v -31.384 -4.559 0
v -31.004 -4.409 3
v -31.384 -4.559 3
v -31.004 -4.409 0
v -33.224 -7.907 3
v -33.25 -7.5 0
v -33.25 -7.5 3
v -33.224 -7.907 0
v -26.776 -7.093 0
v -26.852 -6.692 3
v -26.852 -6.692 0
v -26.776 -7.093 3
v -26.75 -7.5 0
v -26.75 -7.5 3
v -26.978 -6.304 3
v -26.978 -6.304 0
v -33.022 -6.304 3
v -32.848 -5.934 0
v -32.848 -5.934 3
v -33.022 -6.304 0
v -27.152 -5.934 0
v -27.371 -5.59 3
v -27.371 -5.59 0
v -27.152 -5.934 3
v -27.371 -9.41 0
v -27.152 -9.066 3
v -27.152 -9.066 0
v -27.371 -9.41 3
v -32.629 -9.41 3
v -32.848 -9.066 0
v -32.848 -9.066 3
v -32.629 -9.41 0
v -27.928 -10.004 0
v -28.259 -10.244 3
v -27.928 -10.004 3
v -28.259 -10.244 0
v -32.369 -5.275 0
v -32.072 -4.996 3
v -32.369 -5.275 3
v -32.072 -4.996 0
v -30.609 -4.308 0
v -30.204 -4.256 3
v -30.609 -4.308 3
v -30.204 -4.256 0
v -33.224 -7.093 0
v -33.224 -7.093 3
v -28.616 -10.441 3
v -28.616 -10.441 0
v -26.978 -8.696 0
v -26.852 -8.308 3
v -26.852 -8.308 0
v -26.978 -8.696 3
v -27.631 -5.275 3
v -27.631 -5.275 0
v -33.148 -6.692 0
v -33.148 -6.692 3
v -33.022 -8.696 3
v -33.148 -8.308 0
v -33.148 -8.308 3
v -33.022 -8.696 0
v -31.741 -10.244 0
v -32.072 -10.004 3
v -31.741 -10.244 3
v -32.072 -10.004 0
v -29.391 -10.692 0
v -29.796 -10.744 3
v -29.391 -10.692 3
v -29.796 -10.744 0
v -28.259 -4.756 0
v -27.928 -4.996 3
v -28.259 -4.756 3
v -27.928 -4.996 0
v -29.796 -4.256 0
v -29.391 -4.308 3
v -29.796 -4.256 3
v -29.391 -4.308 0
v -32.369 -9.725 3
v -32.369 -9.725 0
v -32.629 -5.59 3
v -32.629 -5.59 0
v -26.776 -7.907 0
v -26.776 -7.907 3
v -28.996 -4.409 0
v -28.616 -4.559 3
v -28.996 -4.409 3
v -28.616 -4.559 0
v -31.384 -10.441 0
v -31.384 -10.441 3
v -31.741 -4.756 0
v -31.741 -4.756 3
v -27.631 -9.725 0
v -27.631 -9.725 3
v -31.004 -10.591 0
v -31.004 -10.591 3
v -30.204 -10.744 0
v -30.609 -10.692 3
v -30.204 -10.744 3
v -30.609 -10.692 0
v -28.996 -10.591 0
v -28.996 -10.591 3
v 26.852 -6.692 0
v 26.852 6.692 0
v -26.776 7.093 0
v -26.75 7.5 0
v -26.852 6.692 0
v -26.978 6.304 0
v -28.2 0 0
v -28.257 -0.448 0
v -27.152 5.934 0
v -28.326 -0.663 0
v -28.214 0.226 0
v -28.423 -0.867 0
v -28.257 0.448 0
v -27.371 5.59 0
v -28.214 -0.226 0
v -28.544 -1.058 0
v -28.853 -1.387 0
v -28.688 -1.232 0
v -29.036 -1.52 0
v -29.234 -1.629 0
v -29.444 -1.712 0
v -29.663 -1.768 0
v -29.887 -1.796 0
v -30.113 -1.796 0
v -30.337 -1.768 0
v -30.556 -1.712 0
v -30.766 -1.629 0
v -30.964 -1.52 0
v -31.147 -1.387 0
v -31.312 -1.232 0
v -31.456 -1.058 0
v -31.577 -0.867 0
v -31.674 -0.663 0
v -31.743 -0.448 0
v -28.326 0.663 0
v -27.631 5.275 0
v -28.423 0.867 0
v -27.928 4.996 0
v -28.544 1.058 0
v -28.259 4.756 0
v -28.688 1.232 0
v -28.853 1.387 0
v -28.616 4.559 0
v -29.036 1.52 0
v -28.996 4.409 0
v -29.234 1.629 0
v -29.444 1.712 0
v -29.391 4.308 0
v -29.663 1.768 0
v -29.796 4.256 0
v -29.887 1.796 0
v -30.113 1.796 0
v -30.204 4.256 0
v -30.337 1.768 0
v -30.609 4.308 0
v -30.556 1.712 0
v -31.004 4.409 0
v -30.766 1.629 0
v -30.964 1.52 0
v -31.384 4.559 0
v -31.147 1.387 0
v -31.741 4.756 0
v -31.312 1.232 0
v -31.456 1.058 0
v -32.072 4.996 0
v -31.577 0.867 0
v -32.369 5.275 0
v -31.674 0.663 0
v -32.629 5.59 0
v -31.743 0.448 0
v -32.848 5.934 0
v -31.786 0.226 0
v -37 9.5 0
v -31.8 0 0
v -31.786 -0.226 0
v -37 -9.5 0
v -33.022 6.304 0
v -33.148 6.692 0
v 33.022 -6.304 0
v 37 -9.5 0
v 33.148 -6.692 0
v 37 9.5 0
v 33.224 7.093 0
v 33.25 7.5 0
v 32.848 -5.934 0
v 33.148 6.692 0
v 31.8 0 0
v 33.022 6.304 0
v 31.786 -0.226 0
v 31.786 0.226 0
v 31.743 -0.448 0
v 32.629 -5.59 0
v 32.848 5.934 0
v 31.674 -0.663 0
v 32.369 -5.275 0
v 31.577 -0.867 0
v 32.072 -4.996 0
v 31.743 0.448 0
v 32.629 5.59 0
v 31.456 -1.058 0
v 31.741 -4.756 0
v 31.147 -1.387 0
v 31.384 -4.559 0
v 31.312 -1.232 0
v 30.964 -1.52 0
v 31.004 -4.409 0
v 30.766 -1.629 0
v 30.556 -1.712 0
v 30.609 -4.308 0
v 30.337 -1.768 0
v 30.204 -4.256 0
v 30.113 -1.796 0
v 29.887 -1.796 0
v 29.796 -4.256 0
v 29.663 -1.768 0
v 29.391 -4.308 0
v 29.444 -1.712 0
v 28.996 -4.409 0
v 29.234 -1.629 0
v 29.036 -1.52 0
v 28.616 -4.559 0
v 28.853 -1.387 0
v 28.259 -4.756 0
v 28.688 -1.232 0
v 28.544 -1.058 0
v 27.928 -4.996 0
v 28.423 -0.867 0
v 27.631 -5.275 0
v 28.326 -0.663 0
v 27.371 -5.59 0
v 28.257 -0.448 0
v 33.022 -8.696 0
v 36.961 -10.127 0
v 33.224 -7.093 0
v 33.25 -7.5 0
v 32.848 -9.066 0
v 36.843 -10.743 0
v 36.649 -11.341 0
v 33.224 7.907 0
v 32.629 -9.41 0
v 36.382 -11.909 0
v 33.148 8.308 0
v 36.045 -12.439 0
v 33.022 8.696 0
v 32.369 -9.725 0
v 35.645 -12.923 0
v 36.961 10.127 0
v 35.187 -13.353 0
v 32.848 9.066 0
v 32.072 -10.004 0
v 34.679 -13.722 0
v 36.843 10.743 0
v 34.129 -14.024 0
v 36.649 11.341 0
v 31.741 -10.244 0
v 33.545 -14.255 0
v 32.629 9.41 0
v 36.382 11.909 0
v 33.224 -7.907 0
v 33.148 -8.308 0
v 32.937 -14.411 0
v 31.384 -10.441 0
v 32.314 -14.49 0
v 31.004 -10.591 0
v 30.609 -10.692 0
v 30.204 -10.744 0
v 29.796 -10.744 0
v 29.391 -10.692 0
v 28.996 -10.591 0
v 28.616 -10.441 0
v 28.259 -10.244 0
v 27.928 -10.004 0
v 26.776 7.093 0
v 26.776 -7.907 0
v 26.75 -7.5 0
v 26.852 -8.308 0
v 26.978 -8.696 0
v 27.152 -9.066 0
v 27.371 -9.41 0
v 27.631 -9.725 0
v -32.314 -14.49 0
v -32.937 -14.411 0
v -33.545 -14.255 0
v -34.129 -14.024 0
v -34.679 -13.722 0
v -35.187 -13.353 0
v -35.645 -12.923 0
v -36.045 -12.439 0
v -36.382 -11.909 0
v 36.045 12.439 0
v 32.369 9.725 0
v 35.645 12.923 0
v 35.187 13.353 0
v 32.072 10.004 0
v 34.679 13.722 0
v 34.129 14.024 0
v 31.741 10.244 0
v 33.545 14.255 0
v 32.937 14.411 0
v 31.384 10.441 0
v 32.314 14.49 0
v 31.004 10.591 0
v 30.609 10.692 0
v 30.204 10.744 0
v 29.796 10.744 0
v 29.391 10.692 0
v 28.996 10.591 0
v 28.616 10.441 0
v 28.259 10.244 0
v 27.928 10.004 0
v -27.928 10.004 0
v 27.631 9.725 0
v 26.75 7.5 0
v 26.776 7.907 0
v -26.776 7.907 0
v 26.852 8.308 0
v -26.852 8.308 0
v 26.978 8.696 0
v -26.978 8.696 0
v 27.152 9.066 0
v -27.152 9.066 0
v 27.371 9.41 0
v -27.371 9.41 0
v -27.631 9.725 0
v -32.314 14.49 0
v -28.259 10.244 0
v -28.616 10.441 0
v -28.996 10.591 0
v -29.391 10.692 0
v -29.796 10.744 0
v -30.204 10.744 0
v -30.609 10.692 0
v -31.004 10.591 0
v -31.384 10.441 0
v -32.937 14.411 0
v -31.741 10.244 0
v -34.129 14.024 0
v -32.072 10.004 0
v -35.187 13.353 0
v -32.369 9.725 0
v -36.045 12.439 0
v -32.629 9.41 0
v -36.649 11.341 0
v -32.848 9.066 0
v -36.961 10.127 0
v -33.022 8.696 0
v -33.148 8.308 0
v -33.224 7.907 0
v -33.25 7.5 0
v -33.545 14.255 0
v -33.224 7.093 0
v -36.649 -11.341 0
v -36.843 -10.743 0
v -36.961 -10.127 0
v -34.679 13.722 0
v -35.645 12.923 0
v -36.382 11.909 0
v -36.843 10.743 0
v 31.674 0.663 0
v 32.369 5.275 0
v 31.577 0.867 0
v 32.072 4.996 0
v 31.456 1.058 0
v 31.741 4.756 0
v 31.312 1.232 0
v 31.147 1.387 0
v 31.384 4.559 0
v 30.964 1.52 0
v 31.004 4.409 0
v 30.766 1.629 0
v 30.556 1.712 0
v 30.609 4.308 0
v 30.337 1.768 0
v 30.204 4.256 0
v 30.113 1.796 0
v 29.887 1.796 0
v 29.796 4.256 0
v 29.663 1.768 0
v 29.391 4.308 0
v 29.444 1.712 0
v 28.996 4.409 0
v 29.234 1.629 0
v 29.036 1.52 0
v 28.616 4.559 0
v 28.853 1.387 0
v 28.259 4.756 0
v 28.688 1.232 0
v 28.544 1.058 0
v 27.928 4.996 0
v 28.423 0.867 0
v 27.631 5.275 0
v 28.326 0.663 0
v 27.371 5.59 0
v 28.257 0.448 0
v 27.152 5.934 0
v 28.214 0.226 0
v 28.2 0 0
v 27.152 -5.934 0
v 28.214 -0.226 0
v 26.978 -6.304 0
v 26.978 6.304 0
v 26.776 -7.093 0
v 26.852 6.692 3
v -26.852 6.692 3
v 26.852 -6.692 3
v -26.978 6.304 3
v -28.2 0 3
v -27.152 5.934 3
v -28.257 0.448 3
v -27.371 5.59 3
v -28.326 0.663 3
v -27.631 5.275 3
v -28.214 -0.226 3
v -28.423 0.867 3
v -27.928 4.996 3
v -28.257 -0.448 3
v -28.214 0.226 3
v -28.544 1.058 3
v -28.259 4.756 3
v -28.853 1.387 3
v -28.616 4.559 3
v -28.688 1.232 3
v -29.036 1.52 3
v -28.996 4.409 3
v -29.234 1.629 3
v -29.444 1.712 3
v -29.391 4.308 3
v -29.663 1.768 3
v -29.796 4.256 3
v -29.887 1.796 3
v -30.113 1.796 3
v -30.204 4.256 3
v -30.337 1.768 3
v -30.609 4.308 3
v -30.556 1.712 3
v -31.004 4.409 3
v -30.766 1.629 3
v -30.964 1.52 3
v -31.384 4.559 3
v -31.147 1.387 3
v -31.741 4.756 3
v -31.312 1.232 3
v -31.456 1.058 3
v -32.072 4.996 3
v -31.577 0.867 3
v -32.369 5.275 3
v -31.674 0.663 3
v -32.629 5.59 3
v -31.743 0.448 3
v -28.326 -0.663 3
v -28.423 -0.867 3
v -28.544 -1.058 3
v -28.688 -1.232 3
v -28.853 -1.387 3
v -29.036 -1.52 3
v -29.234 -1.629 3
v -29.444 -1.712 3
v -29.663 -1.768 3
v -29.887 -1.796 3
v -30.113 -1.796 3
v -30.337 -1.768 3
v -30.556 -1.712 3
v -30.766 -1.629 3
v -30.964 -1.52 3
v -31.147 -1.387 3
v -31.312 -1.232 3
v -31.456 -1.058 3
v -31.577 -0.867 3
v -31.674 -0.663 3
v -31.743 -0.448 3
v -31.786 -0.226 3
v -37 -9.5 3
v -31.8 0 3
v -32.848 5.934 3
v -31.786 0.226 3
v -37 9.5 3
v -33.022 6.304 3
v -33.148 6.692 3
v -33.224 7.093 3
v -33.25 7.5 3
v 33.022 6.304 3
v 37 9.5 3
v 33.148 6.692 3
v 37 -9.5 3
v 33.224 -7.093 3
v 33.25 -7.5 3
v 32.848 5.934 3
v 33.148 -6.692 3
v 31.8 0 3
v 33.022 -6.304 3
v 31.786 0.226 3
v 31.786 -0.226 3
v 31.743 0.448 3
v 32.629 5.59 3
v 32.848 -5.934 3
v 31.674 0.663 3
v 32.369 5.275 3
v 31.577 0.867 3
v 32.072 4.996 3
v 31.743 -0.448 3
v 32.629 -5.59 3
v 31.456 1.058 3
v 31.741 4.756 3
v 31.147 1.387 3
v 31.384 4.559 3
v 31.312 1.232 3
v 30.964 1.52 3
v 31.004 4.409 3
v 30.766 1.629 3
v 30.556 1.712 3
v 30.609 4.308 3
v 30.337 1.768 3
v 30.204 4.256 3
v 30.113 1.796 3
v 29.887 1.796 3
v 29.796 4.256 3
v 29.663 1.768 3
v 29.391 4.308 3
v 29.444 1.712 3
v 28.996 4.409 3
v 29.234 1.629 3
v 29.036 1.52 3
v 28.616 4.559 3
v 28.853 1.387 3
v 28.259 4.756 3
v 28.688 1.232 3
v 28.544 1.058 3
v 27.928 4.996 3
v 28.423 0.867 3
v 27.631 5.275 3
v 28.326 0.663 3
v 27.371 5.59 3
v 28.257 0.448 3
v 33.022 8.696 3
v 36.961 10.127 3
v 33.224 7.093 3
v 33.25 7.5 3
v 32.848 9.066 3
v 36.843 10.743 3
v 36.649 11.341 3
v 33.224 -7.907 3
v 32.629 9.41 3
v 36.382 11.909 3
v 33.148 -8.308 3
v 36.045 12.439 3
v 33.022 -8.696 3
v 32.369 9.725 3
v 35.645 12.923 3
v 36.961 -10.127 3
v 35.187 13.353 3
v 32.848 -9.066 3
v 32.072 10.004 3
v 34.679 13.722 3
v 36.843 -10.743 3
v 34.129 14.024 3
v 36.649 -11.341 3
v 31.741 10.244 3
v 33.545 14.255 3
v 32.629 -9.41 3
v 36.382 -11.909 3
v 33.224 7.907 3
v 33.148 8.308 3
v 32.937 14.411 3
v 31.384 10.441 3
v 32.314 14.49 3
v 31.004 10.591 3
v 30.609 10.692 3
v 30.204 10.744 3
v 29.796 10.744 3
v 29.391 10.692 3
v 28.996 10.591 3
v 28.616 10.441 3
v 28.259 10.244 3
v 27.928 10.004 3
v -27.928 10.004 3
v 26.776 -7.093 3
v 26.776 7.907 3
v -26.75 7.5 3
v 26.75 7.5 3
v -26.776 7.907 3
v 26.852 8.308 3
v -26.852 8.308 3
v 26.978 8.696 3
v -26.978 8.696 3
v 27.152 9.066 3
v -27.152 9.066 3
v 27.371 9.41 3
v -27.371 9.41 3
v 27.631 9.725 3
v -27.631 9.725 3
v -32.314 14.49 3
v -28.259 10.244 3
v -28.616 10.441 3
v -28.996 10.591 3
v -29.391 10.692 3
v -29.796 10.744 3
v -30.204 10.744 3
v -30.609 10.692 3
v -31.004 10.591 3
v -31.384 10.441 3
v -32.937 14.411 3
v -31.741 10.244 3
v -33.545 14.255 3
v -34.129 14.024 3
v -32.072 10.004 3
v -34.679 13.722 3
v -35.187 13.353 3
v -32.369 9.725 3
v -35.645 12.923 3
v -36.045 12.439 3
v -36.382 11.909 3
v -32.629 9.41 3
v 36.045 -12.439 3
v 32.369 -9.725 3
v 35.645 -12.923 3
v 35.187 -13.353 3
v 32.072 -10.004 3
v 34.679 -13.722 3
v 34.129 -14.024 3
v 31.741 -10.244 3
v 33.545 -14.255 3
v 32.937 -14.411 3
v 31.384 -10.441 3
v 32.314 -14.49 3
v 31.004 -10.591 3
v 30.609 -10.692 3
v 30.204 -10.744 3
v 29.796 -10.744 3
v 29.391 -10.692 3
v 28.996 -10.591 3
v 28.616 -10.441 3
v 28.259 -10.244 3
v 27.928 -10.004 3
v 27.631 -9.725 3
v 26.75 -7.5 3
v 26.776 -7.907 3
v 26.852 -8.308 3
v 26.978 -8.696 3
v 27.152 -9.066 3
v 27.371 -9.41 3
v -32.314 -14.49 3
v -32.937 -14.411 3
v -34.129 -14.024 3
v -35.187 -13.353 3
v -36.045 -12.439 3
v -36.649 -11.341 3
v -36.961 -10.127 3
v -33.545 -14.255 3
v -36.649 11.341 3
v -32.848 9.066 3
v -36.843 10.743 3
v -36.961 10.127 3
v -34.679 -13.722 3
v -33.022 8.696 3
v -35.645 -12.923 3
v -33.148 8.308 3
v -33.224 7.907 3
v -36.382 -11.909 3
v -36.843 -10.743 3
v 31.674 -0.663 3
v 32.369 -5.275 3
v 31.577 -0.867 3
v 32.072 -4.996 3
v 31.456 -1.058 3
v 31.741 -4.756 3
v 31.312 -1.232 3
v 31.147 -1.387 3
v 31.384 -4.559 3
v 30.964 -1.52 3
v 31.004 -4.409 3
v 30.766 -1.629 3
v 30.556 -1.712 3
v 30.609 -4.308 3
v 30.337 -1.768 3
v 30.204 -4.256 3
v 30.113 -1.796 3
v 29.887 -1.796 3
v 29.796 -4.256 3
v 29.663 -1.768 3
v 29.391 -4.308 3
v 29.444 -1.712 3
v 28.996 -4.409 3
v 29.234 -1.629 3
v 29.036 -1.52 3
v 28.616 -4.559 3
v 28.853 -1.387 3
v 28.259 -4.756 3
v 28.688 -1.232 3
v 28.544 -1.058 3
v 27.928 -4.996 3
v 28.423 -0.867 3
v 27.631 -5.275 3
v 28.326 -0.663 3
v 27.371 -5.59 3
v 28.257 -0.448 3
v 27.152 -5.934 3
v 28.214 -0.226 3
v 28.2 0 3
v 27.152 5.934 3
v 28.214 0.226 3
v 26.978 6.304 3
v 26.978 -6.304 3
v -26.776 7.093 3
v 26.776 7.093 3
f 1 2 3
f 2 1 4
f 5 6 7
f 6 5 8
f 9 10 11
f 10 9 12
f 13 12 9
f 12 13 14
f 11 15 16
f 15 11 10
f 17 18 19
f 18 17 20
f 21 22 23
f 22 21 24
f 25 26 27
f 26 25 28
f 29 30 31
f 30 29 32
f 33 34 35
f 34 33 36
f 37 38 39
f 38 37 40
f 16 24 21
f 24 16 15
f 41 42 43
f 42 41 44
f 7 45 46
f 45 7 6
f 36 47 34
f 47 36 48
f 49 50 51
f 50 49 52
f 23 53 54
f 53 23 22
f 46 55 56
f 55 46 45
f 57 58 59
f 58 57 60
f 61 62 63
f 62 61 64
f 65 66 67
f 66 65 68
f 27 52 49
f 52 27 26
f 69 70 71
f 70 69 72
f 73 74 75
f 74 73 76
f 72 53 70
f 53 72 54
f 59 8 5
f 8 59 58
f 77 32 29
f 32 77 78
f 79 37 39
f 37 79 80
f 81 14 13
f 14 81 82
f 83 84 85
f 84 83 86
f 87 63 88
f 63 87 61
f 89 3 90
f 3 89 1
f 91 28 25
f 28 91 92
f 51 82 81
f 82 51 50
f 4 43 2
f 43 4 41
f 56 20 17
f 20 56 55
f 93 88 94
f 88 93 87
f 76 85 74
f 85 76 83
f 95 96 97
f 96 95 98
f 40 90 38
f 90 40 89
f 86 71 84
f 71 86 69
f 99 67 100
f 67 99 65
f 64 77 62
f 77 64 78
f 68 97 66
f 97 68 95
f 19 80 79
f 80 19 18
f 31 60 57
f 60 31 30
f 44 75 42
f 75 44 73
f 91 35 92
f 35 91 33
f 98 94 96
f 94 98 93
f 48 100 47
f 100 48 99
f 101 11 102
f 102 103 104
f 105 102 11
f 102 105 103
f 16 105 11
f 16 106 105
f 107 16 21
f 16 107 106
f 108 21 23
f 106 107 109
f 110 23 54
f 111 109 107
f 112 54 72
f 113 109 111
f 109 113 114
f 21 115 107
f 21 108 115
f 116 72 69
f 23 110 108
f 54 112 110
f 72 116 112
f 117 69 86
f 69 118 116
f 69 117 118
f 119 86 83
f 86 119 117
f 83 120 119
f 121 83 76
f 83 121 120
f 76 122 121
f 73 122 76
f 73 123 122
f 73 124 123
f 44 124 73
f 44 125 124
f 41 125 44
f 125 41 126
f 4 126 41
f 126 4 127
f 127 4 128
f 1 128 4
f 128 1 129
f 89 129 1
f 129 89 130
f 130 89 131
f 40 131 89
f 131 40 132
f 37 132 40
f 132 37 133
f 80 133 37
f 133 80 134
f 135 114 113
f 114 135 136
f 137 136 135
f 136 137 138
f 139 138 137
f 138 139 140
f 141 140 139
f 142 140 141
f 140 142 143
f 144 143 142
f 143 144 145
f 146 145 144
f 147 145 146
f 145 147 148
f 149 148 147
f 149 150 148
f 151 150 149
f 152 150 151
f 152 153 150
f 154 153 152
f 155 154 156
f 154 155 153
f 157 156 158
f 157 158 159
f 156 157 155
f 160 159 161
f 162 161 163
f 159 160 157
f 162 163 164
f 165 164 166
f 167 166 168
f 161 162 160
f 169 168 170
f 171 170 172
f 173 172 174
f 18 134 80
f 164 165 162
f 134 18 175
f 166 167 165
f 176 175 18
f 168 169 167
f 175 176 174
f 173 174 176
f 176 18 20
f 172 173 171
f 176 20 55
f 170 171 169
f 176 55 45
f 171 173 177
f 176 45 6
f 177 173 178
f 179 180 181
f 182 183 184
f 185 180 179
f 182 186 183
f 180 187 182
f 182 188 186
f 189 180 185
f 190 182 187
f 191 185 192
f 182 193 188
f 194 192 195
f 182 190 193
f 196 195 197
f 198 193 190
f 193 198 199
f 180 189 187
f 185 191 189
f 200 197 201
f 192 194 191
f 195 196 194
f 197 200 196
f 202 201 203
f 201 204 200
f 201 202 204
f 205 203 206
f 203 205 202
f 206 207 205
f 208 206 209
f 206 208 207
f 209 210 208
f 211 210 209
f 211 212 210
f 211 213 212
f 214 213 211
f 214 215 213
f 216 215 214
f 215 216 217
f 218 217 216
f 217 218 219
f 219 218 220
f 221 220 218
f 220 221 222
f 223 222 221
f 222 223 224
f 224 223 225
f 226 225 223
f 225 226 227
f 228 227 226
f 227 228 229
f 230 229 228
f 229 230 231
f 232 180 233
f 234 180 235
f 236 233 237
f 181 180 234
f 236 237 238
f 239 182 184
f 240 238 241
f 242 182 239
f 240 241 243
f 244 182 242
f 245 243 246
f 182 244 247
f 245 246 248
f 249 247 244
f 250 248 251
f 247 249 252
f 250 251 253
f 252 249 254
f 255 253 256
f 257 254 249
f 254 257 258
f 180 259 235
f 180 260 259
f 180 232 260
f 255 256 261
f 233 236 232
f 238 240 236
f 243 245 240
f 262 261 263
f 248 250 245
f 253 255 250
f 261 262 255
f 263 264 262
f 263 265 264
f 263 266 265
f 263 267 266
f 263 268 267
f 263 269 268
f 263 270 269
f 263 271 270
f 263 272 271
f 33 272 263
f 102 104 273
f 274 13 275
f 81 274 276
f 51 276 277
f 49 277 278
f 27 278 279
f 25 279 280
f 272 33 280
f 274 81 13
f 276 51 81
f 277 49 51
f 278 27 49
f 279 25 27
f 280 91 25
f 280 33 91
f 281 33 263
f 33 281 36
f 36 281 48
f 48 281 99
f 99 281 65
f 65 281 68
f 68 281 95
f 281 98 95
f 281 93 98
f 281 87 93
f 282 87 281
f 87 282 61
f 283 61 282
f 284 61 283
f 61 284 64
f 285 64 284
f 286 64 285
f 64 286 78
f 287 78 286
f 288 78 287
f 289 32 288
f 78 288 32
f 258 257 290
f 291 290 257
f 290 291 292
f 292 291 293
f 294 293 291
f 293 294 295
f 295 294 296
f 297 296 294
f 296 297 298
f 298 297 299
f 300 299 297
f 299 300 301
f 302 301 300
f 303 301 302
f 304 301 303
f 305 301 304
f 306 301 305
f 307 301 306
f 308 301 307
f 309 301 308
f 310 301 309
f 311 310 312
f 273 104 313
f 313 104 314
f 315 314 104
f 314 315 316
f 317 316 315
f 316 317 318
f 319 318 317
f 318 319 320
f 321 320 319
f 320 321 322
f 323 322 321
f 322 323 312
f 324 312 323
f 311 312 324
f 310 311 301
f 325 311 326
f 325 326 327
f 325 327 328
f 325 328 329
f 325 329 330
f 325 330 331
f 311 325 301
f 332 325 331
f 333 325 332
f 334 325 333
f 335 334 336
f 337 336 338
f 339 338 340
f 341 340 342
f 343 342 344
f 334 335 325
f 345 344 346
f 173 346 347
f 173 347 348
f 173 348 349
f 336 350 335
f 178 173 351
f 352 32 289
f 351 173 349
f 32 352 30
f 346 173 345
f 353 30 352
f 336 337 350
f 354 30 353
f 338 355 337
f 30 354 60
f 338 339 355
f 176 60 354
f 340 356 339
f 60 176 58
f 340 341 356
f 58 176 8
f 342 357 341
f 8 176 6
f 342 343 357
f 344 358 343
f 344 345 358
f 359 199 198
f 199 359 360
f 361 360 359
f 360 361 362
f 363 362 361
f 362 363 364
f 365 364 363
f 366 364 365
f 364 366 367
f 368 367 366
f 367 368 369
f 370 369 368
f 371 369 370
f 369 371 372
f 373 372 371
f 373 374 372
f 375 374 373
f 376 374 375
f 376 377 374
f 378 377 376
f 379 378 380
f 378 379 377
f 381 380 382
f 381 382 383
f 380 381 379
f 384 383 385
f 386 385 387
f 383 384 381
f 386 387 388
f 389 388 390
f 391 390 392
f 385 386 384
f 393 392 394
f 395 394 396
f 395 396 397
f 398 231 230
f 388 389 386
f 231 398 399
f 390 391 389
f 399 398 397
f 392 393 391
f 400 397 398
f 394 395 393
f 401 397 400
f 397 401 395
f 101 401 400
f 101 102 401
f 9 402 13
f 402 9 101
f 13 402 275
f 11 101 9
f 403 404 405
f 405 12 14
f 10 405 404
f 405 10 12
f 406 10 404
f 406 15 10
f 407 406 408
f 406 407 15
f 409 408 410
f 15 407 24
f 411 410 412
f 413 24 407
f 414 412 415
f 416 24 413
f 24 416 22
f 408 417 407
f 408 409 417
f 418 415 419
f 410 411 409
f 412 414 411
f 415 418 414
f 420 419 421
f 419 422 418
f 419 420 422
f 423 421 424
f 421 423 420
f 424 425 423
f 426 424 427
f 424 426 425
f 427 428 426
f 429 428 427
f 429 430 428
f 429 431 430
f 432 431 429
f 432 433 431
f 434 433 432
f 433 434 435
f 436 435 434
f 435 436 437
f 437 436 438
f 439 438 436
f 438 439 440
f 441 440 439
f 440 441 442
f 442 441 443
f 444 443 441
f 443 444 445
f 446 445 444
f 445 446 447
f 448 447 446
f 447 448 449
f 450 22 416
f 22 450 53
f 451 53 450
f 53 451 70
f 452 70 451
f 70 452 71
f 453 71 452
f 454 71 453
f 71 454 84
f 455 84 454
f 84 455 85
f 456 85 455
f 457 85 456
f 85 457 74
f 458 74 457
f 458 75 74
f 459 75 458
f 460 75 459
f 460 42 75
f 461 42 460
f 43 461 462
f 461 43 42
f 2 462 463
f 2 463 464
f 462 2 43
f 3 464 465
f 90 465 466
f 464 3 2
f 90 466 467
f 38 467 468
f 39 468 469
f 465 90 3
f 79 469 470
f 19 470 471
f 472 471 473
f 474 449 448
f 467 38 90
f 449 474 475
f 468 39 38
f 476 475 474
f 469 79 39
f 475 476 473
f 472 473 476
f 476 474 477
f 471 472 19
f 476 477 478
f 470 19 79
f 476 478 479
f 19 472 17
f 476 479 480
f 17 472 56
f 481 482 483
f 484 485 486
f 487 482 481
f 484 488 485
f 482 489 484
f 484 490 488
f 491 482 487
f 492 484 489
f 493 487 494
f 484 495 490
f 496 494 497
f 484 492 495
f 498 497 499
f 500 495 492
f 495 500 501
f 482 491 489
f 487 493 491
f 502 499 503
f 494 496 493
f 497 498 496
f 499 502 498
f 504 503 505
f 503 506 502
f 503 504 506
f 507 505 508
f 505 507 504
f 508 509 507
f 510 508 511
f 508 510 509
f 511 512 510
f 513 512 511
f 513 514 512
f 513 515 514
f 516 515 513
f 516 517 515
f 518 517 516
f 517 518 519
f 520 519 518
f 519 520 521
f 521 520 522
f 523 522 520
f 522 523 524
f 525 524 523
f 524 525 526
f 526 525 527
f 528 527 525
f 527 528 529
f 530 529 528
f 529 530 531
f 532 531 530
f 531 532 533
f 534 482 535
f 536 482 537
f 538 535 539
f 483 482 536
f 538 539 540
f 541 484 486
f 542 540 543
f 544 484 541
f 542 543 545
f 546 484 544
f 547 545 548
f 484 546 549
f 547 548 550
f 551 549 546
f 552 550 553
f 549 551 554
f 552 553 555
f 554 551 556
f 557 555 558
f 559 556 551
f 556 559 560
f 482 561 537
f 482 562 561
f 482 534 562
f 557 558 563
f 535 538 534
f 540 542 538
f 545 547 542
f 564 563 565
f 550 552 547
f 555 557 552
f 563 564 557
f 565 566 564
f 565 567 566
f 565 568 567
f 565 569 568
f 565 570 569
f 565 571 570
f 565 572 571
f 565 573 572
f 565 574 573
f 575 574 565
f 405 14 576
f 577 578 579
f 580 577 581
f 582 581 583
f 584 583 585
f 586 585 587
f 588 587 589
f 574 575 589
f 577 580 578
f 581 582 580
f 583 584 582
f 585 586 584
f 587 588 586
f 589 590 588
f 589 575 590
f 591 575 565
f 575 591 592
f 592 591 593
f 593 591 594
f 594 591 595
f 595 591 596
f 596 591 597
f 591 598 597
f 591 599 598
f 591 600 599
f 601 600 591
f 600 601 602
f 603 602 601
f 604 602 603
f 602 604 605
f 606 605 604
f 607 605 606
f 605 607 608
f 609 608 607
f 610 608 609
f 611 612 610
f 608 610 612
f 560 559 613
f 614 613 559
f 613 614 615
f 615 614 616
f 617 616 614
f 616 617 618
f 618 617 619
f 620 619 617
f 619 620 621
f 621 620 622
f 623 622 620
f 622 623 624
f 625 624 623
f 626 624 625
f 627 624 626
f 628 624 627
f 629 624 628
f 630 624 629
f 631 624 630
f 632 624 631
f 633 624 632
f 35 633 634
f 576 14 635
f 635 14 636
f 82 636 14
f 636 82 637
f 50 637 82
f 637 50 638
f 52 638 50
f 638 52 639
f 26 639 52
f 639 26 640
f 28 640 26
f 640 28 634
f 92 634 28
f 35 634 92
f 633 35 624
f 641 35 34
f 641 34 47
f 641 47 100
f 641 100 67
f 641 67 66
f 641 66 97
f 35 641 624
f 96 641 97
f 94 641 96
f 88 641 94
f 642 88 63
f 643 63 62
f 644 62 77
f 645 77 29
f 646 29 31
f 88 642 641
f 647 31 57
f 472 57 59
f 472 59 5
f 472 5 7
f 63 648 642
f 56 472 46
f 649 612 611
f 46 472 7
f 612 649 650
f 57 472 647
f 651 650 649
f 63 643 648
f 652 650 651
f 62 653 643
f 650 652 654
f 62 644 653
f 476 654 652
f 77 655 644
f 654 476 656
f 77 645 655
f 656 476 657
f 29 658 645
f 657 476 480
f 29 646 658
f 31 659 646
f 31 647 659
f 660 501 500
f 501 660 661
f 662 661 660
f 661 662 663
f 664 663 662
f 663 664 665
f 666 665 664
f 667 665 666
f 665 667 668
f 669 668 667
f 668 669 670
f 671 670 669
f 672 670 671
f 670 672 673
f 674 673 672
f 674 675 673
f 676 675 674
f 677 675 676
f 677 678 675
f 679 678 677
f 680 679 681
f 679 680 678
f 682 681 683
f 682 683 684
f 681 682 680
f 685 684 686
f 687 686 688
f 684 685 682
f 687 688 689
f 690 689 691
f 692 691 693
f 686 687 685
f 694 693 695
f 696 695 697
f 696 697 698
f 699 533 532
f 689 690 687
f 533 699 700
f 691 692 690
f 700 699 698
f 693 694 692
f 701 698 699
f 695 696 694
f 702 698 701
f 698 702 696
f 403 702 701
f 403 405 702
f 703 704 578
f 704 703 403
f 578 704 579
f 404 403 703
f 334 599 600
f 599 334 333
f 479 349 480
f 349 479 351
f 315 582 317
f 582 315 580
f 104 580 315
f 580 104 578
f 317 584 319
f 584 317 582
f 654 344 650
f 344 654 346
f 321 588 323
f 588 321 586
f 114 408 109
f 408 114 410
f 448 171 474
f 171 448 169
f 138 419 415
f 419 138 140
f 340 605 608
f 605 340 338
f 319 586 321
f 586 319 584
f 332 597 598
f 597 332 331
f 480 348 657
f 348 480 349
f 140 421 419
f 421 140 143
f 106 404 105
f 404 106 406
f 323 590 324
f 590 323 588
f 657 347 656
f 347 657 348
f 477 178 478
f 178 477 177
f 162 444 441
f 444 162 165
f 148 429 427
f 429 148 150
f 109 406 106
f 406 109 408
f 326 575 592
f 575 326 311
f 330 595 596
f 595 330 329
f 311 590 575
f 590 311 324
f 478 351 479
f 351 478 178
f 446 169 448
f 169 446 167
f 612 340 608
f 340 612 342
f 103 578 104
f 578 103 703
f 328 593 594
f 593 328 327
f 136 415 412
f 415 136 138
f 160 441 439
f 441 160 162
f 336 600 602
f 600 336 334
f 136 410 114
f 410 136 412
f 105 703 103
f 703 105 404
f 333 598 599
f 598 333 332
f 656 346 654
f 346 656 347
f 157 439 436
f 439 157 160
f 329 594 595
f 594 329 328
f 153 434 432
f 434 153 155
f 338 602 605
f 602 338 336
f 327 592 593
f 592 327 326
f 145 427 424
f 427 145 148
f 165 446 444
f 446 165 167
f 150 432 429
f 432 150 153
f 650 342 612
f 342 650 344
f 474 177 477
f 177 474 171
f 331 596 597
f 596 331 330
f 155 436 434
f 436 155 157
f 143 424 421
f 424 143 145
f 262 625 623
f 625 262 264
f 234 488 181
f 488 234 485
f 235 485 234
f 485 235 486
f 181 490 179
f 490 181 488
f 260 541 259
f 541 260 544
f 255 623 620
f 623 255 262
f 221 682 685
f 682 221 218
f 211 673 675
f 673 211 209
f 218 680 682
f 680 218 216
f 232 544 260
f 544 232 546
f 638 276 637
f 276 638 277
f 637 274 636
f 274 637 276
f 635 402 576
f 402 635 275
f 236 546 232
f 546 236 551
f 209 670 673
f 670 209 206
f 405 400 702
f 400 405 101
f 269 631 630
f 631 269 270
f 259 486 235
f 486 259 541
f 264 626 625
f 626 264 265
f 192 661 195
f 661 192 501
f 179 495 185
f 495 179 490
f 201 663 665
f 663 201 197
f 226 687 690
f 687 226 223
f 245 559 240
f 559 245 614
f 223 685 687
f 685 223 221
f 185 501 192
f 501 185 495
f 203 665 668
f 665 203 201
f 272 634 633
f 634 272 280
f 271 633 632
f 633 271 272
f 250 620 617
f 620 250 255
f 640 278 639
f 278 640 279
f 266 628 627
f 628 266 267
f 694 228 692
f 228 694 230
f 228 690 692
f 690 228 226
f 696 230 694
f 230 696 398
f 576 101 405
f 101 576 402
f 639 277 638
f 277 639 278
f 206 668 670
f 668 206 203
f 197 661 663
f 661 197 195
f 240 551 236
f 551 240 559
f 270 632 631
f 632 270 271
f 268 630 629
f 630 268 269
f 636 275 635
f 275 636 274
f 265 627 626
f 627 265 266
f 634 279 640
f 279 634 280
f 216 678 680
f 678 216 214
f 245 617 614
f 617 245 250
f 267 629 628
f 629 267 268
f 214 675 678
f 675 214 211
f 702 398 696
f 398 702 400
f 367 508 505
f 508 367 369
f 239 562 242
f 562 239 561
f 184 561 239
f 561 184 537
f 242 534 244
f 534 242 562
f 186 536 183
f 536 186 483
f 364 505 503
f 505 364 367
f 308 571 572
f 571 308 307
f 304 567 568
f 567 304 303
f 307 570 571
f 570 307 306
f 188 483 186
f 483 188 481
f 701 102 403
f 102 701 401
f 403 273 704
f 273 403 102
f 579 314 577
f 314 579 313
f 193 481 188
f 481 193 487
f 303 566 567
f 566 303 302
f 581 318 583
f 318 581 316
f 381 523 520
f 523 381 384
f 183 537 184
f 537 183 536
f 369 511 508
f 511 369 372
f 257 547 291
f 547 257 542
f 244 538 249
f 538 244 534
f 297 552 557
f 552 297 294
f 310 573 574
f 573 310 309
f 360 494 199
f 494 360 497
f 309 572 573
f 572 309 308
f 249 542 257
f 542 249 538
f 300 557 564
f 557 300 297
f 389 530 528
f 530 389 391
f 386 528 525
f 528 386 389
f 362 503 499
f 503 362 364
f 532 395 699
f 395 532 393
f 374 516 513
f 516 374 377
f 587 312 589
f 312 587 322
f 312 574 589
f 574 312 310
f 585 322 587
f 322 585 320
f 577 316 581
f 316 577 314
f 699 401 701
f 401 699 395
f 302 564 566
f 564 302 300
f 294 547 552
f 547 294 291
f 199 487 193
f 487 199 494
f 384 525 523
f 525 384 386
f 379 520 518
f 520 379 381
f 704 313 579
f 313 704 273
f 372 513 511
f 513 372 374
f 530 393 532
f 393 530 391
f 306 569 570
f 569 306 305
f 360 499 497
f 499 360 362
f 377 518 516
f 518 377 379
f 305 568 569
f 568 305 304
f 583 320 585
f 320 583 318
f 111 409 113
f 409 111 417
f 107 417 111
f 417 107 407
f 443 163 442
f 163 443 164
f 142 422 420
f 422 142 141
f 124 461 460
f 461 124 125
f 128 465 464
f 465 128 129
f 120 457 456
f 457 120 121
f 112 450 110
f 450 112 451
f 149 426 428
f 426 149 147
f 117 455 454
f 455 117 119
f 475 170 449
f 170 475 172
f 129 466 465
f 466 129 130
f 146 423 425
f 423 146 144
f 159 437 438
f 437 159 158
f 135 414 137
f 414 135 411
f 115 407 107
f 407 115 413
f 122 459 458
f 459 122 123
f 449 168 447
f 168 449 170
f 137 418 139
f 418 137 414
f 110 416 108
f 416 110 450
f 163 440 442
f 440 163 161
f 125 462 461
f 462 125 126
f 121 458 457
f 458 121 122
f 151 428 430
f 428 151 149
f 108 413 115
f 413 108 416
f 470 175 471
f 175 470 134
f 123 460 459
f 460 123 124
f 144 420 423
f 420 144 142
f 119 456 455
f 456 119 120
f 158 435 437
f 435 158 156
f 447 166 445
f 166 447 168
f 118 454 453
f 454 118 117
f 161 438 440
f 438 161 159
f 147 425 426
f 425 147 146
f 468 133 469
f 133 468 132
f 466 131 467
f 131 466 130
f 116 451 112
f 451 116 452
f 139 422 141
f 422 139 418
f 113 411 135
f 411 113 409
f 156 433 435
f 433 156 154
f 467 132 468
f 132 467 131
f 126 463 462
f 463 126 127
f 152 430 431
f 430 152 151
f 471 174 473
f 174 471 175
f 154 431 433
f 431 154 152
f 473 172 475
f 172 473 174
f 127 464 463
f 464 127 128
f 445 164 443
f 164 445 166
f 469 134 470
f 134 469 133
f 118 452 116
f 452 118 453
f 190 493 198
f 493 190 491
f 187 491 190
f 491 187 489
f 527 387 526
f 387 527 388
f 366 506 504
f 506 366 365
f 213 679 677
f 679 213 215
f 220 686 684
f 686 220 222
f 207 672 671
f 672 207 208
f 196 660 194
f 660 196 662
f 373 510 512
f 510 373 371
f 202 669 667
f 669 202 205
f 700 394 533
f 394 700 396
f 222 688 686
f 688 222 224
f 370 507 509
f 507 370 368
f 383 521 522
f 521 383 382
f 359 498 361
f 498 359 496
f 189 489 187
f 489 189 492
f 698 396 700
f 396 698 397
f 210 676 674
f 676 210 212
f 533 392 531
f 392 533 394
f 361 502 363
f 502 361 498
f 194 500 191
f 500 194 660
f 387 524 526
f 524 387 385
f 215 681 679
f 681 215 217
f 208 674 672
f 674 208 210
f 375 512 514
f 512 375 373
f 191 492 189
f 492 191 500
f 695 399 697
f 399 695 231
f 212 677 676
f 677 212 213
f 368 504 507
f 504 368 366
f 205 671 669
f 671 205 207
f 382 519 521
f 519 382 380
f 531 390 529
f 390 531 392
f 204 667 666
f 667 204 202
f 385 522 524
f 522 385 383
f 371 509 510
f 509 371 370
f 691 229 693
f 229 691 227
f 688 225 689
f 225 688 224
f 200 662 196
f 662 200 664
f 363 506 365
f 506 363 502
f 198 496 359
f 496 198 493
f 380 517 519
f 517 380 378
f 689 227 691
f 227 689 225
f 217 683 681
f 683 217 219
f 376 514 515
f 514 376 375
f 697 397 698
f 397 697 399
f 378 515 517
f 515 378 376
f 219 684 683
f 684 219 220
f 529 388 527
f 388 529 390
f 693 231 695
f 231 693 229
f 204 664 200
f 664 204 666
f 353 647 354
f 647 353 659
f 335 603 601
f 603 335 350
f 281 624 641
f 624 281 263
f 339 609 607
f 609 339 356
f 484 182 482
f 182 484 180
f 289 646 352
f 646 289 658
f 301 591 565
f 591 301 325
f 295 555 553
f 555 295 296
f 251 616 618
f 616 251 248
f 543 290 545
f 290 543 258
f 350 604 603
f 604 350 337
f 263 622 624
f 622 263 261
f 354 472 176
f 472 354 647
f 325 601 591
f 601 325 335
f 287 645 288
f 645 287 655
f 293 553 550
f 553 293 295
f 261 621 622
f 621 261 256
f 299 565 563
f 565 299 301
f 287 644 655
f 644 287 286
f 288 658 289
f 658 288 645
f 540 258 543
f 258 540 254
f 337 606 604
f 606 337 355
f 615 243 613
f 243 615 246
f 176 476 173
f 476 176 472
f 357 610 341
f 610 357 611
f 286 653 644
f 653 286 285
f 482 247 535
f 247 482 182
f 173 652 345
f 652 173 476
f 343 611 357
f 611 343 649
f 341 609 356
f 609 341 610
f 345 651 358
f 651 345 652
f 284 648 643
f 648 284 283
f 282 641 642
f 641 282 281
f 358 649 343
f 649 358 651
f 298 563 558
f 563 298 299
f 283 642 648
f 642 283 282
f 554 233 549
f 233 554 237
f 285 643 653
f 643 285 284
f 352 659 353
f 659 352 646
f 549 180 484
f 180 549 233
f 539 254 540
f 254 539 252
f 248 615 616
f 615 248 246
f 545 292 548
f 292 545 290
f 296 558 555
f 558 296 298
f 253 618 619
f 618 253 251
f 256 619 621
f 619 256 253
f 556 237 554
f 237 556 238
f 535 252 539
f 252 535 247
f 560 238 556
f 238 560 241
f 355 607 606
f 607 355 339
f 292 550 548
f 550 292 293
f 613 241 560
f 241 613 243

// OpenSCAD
$fn = 50;


difference() {
	union() {
		hull() {
			translate(v = [-32.0000000000, 9.5000000000, 0]) {
				cylinder(h = 3, r = 5);
			}
			translate(v = [32.0000000000, 9.5000000000, 0]) {
				cylinder(h = 3, r = 5);
			}
			translate(v = [-32.0000000000, -9.5000000000, 0]) {
				cylinder(h = 3, r = 5);
			}
			translate(v = [32.0000000000, -9.5000000000, 0]) {
				cylinder(h = 3, r = 5);
			}
		}
	}
	union() {
		translate(v = [-30.0000000000, -7.5000000000, 0]) {
			cylinder(h = 3, r = 3.2500000000);
		}
		translate(v = [-30.0000000000, 7.5000000000, 0]) {
			cylinder(h = 3, r = 3.2500000000);
		}
		translate(v = [30.0000000000, -7.5000000000, 0]) {
			cylinder(h = 3, r = 3.2500000000);
		}
		translate(v = [30.0000000000, 7.5000000000, 0]) {
			cylinder(h = 3, r = 3.2500000000);
		}
		translate(v = [-30.0000000000, -7.5000000000, 0]) {
			cylinder(h = 3, r = 1.8000000000);
		}
		translate(v = [-30.0000000000, 0.0000000000, 0]) {
			cylinder(h = 3, r = 1.8000000000);
		}
		translate(v = [-30.0000000000, 7.5000000000, 0]) {
			cylinder(h = 3, r = 1.8000000000);
		}
		translate(v = [30.0000000000, -7.5000000000, 0]) {
			cylinder(h = 3, r = 1.8000000000);
		}
		translate(v = [30.0000000000, 0.0000000000, 0]) {
			cylinder(h = 3, r = 1.8000000000);
		}
		translate(v = [30.0000000000, 7.5000000000, 0]) {
			cylinder(h = 3, r = 1.8000000000);
		}
		translate(v = [-30.0000000000, -7.5000000000, 0]) {
			cylinder(h = 3, r = 1.8000000000);
		}
		translate(v = [-30.0000000000, 0.0000000000, 0]) {
			cylinder(h = 3, r = 1.8000000000);
		}
		translate(v = [-30.0000000000, 7.5000000000, 0]) {
			cylinder(h = 3, r = 1.8000000000);
		}
		translate(v = [30.0000000000, -7.5000000000, 0]) {
			cylinder(h = 3, r = 1.8000000000);
		}
		translate(v = [30.0000000000, 0.0000000000, 0]) {
			cylinder(h = 3, r = 1.8000000000);
		}
		translate(v = [30.0000000000, 7.5000000000, 0]) {
			cylinder(h = 3, r = 1.8000000000);
		}
		translate(v = [-30.0000000000, -7.5000000000, 0]) {
			cylinder(h = 3, r = 1.8000000000);
		}
		translate(v = [-30.0000000000, 0.0000000000, 0]) {
			cylinder(h = 3, r = 1.8000000000);
		}
		translate(v = [-30.0000000000, 7.5000000000, 0]) {
			cylinder(h = 3, r = 1.8000000000);
		}
		translate(v = [30.0000000000, -7.5000000000, 0]) {
			cylinder(h = 3, r = 1.8000000000);
		}
		translate(v = [30.0000000000, 0.0000000000, 0]) {
			cylinder(h = 3, r = 1.8000000000);
		}
		translate(v = [30.0000000000, 7.5000000000, 0]) {
			cylinder(h = 3, r = 1.8000000000);
		}
	}
}
